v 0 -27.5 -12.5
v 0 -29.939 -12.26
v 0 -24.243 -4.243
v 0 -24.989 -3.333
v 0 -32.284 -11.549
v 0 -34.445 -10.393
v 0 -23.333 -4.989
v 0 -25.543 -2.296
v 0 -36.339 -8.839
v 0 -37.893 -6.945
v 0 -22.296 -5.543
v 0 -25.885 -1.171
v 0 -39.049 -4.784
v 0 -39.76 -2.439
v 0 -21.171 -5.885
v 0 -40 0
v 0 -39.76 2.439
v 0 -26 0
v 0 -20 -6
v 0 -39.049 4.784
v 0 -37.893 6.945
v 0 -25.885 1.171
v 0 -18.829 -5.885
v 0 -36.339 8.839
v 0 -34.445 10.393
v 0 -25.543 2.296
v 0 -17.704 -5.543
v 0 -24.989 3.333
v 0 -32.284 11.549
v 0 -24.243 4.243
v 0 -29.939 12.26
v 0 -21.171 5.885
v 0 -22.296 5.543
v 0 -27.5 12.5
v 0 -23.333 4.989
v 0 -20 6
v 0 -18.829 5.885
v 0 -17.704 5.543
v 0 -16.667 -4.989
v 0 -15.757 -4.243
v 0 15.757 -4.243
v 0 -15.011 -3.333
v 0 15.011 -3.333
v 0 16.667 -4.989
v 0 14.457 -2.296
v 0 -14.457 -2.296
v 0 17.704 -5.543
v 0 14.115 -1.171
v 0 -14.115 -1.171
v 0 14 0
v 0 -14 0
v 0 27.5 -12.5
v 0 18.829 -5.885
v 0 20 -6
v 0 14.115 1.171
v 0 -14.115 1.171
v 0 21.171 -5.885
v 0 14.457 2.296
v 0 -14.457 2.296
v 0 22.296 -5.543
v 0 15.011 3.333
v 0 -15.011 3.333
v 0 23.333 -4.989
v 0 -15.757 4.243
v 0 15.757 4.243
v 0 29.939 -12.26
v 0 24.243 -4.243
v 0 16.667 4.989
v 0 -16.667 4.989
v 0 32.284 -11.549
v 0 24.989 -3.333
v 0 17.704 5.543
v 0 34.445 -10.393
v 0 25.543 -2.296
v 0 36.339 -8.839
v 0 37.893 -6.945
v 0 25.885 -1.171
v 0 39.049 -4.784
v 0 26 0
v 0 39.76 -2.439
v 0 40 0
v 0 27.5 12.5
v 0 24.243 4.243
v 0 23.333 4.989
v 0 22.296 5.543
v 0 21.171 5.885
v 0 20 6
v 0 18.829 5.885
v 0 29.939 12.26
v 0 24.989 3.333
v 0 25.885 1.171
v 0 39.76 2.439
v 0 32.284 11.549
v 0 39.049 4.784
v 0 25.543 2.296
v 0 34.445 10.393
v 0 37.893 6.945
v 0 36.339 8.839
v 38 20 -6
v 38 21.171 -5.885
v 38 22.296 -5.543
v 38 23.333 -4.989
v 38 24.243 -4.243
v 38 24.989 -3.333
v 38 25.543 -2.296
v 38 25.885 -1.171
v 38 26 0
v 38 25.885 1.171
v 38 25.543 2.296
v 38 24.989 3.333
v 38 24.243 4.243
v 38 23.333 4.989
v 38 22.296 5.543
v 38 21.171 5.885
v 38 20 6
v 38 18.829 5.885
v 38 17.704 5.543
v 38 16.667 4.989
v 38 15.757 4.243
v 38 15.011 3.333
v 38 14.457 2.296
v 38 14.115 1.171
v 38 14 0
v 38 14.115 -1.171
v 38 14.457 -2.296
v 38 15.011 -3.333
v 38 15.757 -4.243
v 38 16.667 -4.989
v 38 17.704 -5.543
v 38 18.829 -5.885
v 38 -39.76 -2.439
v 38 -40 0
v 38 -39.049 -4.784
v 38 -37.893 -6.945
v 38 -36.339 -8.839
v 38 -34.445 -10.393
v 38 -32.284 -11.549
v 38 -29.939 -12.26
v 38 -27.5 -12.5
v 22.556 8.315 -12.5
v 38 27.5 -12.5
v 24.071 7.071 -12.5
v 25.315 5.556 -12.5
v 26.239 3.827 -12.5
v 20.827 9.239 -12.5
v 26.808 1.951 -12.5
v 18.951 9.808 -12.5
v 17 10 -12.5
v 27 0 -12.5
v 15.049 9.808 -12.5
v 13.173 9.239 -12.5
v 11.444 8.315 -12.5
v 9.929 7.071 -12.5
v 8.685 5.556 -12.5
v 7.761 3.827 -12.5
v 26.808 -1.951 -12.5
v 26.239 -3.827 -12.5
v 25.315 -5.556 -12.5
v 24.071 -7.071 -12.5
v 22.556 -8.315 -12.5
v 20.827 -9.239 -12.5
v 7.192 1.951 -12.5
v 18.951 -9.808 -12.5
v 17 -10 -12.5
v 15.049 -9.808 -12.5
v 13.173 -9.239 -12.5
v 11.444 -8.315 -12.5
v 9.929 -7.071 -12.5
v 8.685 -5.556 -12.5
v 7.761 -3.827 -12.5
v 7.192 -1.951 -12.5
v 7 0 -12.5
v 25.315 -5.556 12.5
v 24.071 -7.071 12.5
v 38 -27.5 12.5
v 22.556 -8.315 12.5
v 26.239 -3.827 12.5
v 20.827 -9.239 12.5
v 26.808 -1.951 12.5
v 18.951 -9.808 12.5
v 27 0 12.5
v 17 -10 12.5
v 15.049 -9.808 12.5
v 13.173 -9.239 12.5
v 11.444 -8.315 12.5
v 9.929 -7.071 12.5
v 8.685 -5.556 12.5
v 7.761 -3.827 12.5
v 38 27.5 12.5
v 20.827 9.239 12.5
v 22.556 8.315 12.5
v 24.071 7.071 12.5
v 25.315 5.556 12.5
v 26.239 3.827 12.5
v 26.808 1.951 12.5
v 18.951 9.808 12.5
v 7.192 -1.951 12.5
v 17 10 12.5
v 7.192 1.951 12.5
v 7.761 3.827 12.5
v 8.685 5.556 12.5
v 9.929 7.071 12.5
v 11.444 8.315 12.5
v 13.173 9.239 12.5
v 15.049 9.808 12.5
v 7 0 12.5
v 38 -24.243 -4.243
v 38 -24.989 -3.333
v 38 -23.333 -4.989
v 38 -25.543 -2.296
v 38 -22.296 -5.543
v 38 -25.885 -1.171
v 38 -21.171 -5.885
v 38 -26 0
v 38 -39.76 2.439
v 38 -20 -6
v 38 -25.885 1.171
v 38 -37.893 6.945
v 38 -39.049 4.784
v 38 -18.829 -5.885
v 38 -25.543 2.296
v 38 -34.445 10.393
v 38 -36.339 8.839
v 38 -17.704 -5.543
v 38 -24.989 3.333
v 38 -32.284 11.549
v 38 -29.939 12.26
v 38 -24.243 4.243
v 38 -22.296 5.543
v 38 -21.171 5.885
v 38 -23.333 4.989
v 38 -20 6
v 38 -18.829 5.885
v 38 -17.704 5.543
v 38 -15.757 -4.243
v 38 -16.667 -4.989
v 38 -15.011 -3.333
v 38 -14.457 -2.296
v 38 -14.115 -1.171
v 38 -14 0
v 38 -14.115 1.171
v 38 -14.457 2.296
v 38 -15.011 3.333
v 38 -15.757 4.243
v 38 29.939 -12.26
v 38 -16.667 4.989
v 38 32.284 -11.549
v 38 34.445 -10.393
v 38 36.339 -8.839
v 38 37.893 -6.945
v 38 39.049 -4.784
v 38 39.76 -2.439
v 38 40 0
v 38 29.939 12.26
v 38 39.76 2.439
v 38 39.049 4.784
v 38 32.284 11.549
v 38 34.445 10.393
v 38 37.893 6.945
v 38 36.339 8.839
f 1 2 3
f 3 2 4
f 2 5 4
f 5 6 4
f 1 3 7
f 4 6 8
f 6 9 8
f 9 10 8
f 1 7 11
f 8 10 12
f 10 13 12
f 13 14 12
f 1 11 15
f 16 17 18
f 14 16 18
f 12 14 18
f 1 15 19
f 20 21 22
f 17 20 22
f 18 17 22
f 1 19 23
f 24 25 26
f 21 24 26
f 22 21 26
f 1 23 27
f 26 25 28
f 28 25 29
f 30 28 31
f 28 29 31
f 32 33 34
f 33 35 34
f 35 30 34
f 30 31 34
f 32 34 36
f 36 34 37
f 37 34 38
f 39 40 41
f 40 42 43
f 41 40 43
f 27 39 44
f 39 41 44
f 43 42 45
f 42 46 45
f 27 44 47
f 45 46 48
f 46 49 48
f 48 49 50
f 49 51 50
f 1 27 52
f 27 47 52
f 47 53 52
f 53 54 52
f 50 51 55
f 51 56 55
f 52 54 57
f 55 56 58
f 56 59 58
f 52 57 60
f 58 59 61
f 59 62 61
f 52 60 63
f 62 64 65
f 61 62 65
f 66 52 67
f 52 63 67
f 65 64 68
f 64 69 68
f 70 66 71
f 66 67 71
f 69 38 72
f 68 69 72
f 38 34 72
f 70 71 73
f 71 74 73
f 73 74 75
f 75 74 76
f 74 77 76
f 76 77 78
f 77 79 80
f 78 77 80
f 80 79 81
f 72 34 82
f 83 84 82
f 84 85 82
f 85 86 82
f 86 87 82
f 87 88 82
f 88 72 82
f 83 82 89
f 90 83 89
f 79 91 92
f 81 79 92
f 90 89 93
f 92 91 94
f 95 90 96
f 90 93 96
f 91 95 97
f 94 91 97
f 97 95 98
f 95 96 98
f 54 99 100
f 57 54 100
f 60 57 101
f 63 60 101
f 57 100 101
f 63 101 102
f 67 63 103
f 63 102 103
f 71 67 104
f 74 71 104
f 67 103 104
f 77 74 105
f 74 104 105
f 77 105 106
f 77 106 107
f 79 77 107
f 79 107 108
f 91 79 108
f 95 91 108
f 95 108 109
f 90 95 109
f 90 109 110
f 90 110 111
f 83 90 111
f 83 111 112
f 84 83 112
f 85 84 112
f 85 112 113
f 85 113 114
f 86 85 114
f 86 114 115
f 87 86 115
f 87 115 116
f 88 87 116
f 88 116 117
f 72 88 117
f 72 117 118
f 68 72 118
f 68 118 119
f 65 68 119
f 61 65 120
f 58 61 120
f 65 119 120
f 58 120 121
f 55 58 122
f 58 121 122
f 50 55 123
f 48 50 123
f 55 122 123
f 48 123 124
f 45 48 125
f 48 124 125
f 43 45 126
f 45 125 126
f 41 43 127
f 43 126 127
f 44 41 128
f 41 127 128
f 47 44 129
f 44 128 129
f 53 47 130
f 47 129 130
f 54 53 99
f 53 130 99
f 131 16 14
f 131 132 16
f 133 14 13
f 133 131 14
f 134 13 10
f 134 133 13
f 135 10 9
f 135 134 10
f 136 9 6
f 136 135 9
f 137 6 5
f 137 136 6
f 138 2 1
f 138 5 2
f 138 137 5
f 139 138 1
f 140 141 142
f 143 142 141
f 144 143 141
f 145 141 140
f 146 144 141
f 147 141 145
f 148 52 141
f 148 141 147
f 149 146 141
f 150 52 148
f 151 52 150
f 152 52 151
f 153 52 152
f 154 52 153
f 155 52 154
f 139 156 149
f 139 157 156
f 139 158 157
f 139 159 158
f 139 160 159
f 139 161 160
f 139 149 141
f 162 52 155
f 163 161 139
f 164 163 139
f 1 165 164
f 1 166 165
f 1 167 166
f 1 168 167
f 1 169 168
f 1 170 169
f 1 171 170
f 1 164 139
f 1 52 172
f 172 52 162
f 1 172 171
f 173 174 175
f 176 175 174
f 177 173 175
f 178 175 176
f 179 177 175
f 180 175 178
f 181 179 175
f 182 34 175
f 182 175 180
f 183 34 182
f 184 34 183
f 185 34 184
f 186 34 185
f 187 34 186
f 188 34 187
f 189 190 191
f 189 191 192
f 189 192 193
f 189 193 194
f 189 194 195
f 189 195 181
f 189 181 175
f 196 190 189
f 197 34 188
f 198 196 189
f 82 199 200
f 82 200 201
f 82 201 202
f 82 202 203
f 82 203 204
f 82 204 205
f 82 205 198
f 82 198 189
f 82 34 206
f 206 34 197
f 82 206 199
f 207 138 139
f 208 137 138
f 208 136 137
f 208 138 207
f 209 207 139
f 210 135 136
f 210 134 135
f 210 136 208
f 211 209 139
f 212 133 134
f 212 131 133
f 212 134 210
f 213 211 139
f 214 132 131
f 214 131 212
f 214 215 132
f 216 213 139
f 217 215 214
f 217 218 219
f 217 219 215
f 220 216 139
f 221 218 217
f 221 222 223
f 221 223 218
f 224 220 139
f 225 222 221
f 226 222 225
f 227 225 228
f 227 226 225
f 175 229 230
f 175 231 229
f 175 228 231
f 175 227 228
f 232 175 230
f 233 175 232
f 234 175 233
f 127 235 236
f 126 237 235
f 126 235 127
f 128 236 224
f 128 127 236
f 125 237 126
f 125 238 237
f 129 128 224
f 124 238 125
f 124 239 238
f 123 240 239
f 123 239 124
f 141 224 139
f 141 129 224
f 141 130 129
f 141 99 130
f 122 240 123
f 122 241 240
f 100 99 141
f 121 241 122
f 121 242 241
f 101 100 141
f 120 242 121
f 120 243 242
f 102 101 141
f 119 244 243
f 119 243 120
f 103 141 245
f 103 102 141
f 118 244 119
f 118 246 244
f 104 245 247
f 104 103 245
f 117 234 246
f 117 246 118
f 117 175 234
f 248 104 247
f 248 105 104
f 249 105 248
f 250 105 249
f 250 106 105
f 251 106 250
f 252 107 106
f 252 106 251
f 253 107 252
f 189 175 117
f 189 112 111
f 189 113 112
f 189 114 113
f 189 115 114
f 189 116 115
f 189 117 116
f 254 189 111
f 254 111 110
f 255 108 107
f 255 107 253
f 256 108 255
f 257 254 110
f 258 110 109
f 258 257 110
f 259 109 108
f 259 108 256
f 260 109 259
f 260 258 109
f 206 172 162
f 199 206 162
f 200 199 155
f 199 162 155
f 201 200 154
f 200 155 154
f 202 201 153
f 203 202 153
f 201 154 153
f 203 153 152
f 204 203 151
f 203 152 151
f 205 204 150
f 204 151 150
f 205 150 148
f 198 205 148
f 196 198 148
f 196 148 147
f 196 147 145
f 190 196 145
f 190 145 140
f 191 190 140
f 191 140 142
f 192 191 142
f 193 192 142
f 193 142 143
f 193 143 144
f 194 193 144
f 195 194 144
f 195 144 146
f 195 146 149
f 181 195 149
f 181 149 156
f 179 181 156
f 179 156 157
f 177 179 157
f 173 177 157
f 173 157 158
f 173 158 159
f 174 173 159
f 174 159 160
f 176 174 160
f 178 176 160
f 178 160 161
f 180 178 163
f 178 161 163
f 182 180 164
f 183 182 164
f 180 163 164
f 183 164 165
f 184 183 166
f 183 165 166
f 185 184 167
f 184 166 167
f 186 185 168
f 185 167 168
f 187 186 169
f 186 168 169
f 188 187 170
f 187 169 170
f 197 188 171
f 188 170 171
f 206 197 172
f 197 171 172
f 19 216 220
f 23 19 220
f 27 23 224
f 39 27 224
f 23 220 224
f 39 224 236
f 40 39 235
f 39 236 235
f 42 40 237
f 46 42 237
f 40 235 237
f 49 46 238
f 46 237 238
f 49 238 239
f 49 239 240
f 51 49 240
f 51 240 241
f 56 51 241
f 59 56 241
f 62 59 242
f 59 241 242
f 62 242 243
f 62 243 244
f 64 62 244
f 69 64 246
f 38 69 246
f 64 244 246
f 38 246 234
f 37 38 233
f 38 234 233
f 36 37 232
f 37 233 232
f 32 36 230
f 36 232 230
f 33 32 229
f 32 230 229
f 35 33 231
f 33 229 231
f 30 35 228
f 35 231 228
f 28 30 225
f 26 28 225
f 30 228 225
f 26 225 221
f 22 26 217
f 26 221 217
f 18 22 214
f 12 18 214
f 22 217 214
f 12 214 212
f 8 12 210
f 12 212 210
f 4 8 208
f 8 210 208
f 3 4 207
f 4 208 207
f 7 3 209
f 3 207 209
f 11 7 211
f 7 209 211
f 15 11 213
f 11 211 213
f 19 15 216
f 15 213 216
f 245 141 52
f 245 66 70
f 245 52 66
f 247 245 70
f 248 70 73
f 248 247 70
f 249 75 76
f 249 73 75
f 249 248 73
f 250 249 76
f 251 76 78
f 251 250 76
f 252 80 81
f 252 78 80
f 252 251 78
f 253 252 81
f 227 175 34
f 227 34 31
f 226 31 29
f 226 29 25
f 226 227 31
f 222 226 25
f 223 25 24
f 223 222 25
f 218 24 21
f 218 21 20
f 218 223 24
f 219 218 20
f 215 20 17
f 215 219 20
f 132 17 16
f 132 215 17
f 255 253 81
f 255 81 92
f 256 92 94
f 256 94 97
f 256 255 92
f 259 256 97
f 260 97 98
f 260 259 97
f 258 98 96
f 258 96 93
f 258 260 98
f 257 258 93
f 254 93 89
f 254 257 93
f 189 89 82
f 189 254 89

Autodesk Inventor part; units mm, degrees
ref_plane "YZ Plane" through (0, 0, 0) normal (1, 0, 0) x (0, 1, 0)
ref_plane "XZ Plane" through (0, 0, 0) normal (0, 1, 0) x (-1, 0, 0)
ref_plane "XY Plane" through (0, 0, 0) normal (0, 0, 1) x (1, 0, 0)
sketch "Sketch2" plane through (0, 0, 0) normal (1, 0, 0) x (0, 1, 0)
  line L0 (40, 12.5) -> (40, -12.5)
  line L1 (40, -12.5) -> (-40, -12.5)
  line L2 (-40, -12.5) -> (-40, 12.5)
  line L3 (-40, 12.5) -> (40, 12.5)
  point P0 (0, 0)
  dimension "d11" = 25
  dimension "d12" = 80
  dimension "d13" = 40
  dimension "d14" = 12.5
extrude "Extrusion2" add sketch "Sketch2" along normal blind 38
full round fillet "Full Round Fillet1" first side at (25.3333, 13.3333, 12.5) centre faces at (12.6667, 40, -4.1667) second side at (25.3333, -13.3333, -12.5)
full round fillet "Full Round Fillet2" first side at (25.3333, 5.0001, 12.5) centre faces at (12.6667, -40, 4.1667) second side at (25.3333, -17.5, -12.5)
sketch "Sketch3" plane through (38, 27.5, -12.5) normal (0, 0, -1) x (-1, 0, 0)
  circle A0 centre (21, -27.5) radius 10
  line L0 (38, -55) -> (38, 0) projected
  point P0 (38, -27.5)
  point P1 (38, -27.5)
  dimension "d15" = 20
  dimension "d16" = 17
sketch "Sketch4" plane through (38, 0, 0) normal (1, 0, 0) x (0, 0, -1)
  circle A0 centre (0, -20) radius 6
  circle A1 centre (0, 20) radius 6
  point P0 (0, 0)
  dimension "d17" = 12
  dimension "d18" = 12
  dimension "d31" = 40
  dimension "d32" = 20
extrude "Extrusion3" cut sketch "Sketch3" against normal blind 42
extrude "Extrusion4" cut sketch "Sketch4" against normal blind 42
thread "Thread4" size "M20x2.5" class "6H" standard "ANSI Metric M Profile" full length
thread "Thread7" size "M12x1.75" class "6H" standard "ANSI Metric M Profile" length 350
thread "Thread8" size "M12x1.75" class "6H" standard "ANSI Metric M Profile" length 350
properties part number "Junção Fuso" material "Steel AISI 4142 380 QT"
